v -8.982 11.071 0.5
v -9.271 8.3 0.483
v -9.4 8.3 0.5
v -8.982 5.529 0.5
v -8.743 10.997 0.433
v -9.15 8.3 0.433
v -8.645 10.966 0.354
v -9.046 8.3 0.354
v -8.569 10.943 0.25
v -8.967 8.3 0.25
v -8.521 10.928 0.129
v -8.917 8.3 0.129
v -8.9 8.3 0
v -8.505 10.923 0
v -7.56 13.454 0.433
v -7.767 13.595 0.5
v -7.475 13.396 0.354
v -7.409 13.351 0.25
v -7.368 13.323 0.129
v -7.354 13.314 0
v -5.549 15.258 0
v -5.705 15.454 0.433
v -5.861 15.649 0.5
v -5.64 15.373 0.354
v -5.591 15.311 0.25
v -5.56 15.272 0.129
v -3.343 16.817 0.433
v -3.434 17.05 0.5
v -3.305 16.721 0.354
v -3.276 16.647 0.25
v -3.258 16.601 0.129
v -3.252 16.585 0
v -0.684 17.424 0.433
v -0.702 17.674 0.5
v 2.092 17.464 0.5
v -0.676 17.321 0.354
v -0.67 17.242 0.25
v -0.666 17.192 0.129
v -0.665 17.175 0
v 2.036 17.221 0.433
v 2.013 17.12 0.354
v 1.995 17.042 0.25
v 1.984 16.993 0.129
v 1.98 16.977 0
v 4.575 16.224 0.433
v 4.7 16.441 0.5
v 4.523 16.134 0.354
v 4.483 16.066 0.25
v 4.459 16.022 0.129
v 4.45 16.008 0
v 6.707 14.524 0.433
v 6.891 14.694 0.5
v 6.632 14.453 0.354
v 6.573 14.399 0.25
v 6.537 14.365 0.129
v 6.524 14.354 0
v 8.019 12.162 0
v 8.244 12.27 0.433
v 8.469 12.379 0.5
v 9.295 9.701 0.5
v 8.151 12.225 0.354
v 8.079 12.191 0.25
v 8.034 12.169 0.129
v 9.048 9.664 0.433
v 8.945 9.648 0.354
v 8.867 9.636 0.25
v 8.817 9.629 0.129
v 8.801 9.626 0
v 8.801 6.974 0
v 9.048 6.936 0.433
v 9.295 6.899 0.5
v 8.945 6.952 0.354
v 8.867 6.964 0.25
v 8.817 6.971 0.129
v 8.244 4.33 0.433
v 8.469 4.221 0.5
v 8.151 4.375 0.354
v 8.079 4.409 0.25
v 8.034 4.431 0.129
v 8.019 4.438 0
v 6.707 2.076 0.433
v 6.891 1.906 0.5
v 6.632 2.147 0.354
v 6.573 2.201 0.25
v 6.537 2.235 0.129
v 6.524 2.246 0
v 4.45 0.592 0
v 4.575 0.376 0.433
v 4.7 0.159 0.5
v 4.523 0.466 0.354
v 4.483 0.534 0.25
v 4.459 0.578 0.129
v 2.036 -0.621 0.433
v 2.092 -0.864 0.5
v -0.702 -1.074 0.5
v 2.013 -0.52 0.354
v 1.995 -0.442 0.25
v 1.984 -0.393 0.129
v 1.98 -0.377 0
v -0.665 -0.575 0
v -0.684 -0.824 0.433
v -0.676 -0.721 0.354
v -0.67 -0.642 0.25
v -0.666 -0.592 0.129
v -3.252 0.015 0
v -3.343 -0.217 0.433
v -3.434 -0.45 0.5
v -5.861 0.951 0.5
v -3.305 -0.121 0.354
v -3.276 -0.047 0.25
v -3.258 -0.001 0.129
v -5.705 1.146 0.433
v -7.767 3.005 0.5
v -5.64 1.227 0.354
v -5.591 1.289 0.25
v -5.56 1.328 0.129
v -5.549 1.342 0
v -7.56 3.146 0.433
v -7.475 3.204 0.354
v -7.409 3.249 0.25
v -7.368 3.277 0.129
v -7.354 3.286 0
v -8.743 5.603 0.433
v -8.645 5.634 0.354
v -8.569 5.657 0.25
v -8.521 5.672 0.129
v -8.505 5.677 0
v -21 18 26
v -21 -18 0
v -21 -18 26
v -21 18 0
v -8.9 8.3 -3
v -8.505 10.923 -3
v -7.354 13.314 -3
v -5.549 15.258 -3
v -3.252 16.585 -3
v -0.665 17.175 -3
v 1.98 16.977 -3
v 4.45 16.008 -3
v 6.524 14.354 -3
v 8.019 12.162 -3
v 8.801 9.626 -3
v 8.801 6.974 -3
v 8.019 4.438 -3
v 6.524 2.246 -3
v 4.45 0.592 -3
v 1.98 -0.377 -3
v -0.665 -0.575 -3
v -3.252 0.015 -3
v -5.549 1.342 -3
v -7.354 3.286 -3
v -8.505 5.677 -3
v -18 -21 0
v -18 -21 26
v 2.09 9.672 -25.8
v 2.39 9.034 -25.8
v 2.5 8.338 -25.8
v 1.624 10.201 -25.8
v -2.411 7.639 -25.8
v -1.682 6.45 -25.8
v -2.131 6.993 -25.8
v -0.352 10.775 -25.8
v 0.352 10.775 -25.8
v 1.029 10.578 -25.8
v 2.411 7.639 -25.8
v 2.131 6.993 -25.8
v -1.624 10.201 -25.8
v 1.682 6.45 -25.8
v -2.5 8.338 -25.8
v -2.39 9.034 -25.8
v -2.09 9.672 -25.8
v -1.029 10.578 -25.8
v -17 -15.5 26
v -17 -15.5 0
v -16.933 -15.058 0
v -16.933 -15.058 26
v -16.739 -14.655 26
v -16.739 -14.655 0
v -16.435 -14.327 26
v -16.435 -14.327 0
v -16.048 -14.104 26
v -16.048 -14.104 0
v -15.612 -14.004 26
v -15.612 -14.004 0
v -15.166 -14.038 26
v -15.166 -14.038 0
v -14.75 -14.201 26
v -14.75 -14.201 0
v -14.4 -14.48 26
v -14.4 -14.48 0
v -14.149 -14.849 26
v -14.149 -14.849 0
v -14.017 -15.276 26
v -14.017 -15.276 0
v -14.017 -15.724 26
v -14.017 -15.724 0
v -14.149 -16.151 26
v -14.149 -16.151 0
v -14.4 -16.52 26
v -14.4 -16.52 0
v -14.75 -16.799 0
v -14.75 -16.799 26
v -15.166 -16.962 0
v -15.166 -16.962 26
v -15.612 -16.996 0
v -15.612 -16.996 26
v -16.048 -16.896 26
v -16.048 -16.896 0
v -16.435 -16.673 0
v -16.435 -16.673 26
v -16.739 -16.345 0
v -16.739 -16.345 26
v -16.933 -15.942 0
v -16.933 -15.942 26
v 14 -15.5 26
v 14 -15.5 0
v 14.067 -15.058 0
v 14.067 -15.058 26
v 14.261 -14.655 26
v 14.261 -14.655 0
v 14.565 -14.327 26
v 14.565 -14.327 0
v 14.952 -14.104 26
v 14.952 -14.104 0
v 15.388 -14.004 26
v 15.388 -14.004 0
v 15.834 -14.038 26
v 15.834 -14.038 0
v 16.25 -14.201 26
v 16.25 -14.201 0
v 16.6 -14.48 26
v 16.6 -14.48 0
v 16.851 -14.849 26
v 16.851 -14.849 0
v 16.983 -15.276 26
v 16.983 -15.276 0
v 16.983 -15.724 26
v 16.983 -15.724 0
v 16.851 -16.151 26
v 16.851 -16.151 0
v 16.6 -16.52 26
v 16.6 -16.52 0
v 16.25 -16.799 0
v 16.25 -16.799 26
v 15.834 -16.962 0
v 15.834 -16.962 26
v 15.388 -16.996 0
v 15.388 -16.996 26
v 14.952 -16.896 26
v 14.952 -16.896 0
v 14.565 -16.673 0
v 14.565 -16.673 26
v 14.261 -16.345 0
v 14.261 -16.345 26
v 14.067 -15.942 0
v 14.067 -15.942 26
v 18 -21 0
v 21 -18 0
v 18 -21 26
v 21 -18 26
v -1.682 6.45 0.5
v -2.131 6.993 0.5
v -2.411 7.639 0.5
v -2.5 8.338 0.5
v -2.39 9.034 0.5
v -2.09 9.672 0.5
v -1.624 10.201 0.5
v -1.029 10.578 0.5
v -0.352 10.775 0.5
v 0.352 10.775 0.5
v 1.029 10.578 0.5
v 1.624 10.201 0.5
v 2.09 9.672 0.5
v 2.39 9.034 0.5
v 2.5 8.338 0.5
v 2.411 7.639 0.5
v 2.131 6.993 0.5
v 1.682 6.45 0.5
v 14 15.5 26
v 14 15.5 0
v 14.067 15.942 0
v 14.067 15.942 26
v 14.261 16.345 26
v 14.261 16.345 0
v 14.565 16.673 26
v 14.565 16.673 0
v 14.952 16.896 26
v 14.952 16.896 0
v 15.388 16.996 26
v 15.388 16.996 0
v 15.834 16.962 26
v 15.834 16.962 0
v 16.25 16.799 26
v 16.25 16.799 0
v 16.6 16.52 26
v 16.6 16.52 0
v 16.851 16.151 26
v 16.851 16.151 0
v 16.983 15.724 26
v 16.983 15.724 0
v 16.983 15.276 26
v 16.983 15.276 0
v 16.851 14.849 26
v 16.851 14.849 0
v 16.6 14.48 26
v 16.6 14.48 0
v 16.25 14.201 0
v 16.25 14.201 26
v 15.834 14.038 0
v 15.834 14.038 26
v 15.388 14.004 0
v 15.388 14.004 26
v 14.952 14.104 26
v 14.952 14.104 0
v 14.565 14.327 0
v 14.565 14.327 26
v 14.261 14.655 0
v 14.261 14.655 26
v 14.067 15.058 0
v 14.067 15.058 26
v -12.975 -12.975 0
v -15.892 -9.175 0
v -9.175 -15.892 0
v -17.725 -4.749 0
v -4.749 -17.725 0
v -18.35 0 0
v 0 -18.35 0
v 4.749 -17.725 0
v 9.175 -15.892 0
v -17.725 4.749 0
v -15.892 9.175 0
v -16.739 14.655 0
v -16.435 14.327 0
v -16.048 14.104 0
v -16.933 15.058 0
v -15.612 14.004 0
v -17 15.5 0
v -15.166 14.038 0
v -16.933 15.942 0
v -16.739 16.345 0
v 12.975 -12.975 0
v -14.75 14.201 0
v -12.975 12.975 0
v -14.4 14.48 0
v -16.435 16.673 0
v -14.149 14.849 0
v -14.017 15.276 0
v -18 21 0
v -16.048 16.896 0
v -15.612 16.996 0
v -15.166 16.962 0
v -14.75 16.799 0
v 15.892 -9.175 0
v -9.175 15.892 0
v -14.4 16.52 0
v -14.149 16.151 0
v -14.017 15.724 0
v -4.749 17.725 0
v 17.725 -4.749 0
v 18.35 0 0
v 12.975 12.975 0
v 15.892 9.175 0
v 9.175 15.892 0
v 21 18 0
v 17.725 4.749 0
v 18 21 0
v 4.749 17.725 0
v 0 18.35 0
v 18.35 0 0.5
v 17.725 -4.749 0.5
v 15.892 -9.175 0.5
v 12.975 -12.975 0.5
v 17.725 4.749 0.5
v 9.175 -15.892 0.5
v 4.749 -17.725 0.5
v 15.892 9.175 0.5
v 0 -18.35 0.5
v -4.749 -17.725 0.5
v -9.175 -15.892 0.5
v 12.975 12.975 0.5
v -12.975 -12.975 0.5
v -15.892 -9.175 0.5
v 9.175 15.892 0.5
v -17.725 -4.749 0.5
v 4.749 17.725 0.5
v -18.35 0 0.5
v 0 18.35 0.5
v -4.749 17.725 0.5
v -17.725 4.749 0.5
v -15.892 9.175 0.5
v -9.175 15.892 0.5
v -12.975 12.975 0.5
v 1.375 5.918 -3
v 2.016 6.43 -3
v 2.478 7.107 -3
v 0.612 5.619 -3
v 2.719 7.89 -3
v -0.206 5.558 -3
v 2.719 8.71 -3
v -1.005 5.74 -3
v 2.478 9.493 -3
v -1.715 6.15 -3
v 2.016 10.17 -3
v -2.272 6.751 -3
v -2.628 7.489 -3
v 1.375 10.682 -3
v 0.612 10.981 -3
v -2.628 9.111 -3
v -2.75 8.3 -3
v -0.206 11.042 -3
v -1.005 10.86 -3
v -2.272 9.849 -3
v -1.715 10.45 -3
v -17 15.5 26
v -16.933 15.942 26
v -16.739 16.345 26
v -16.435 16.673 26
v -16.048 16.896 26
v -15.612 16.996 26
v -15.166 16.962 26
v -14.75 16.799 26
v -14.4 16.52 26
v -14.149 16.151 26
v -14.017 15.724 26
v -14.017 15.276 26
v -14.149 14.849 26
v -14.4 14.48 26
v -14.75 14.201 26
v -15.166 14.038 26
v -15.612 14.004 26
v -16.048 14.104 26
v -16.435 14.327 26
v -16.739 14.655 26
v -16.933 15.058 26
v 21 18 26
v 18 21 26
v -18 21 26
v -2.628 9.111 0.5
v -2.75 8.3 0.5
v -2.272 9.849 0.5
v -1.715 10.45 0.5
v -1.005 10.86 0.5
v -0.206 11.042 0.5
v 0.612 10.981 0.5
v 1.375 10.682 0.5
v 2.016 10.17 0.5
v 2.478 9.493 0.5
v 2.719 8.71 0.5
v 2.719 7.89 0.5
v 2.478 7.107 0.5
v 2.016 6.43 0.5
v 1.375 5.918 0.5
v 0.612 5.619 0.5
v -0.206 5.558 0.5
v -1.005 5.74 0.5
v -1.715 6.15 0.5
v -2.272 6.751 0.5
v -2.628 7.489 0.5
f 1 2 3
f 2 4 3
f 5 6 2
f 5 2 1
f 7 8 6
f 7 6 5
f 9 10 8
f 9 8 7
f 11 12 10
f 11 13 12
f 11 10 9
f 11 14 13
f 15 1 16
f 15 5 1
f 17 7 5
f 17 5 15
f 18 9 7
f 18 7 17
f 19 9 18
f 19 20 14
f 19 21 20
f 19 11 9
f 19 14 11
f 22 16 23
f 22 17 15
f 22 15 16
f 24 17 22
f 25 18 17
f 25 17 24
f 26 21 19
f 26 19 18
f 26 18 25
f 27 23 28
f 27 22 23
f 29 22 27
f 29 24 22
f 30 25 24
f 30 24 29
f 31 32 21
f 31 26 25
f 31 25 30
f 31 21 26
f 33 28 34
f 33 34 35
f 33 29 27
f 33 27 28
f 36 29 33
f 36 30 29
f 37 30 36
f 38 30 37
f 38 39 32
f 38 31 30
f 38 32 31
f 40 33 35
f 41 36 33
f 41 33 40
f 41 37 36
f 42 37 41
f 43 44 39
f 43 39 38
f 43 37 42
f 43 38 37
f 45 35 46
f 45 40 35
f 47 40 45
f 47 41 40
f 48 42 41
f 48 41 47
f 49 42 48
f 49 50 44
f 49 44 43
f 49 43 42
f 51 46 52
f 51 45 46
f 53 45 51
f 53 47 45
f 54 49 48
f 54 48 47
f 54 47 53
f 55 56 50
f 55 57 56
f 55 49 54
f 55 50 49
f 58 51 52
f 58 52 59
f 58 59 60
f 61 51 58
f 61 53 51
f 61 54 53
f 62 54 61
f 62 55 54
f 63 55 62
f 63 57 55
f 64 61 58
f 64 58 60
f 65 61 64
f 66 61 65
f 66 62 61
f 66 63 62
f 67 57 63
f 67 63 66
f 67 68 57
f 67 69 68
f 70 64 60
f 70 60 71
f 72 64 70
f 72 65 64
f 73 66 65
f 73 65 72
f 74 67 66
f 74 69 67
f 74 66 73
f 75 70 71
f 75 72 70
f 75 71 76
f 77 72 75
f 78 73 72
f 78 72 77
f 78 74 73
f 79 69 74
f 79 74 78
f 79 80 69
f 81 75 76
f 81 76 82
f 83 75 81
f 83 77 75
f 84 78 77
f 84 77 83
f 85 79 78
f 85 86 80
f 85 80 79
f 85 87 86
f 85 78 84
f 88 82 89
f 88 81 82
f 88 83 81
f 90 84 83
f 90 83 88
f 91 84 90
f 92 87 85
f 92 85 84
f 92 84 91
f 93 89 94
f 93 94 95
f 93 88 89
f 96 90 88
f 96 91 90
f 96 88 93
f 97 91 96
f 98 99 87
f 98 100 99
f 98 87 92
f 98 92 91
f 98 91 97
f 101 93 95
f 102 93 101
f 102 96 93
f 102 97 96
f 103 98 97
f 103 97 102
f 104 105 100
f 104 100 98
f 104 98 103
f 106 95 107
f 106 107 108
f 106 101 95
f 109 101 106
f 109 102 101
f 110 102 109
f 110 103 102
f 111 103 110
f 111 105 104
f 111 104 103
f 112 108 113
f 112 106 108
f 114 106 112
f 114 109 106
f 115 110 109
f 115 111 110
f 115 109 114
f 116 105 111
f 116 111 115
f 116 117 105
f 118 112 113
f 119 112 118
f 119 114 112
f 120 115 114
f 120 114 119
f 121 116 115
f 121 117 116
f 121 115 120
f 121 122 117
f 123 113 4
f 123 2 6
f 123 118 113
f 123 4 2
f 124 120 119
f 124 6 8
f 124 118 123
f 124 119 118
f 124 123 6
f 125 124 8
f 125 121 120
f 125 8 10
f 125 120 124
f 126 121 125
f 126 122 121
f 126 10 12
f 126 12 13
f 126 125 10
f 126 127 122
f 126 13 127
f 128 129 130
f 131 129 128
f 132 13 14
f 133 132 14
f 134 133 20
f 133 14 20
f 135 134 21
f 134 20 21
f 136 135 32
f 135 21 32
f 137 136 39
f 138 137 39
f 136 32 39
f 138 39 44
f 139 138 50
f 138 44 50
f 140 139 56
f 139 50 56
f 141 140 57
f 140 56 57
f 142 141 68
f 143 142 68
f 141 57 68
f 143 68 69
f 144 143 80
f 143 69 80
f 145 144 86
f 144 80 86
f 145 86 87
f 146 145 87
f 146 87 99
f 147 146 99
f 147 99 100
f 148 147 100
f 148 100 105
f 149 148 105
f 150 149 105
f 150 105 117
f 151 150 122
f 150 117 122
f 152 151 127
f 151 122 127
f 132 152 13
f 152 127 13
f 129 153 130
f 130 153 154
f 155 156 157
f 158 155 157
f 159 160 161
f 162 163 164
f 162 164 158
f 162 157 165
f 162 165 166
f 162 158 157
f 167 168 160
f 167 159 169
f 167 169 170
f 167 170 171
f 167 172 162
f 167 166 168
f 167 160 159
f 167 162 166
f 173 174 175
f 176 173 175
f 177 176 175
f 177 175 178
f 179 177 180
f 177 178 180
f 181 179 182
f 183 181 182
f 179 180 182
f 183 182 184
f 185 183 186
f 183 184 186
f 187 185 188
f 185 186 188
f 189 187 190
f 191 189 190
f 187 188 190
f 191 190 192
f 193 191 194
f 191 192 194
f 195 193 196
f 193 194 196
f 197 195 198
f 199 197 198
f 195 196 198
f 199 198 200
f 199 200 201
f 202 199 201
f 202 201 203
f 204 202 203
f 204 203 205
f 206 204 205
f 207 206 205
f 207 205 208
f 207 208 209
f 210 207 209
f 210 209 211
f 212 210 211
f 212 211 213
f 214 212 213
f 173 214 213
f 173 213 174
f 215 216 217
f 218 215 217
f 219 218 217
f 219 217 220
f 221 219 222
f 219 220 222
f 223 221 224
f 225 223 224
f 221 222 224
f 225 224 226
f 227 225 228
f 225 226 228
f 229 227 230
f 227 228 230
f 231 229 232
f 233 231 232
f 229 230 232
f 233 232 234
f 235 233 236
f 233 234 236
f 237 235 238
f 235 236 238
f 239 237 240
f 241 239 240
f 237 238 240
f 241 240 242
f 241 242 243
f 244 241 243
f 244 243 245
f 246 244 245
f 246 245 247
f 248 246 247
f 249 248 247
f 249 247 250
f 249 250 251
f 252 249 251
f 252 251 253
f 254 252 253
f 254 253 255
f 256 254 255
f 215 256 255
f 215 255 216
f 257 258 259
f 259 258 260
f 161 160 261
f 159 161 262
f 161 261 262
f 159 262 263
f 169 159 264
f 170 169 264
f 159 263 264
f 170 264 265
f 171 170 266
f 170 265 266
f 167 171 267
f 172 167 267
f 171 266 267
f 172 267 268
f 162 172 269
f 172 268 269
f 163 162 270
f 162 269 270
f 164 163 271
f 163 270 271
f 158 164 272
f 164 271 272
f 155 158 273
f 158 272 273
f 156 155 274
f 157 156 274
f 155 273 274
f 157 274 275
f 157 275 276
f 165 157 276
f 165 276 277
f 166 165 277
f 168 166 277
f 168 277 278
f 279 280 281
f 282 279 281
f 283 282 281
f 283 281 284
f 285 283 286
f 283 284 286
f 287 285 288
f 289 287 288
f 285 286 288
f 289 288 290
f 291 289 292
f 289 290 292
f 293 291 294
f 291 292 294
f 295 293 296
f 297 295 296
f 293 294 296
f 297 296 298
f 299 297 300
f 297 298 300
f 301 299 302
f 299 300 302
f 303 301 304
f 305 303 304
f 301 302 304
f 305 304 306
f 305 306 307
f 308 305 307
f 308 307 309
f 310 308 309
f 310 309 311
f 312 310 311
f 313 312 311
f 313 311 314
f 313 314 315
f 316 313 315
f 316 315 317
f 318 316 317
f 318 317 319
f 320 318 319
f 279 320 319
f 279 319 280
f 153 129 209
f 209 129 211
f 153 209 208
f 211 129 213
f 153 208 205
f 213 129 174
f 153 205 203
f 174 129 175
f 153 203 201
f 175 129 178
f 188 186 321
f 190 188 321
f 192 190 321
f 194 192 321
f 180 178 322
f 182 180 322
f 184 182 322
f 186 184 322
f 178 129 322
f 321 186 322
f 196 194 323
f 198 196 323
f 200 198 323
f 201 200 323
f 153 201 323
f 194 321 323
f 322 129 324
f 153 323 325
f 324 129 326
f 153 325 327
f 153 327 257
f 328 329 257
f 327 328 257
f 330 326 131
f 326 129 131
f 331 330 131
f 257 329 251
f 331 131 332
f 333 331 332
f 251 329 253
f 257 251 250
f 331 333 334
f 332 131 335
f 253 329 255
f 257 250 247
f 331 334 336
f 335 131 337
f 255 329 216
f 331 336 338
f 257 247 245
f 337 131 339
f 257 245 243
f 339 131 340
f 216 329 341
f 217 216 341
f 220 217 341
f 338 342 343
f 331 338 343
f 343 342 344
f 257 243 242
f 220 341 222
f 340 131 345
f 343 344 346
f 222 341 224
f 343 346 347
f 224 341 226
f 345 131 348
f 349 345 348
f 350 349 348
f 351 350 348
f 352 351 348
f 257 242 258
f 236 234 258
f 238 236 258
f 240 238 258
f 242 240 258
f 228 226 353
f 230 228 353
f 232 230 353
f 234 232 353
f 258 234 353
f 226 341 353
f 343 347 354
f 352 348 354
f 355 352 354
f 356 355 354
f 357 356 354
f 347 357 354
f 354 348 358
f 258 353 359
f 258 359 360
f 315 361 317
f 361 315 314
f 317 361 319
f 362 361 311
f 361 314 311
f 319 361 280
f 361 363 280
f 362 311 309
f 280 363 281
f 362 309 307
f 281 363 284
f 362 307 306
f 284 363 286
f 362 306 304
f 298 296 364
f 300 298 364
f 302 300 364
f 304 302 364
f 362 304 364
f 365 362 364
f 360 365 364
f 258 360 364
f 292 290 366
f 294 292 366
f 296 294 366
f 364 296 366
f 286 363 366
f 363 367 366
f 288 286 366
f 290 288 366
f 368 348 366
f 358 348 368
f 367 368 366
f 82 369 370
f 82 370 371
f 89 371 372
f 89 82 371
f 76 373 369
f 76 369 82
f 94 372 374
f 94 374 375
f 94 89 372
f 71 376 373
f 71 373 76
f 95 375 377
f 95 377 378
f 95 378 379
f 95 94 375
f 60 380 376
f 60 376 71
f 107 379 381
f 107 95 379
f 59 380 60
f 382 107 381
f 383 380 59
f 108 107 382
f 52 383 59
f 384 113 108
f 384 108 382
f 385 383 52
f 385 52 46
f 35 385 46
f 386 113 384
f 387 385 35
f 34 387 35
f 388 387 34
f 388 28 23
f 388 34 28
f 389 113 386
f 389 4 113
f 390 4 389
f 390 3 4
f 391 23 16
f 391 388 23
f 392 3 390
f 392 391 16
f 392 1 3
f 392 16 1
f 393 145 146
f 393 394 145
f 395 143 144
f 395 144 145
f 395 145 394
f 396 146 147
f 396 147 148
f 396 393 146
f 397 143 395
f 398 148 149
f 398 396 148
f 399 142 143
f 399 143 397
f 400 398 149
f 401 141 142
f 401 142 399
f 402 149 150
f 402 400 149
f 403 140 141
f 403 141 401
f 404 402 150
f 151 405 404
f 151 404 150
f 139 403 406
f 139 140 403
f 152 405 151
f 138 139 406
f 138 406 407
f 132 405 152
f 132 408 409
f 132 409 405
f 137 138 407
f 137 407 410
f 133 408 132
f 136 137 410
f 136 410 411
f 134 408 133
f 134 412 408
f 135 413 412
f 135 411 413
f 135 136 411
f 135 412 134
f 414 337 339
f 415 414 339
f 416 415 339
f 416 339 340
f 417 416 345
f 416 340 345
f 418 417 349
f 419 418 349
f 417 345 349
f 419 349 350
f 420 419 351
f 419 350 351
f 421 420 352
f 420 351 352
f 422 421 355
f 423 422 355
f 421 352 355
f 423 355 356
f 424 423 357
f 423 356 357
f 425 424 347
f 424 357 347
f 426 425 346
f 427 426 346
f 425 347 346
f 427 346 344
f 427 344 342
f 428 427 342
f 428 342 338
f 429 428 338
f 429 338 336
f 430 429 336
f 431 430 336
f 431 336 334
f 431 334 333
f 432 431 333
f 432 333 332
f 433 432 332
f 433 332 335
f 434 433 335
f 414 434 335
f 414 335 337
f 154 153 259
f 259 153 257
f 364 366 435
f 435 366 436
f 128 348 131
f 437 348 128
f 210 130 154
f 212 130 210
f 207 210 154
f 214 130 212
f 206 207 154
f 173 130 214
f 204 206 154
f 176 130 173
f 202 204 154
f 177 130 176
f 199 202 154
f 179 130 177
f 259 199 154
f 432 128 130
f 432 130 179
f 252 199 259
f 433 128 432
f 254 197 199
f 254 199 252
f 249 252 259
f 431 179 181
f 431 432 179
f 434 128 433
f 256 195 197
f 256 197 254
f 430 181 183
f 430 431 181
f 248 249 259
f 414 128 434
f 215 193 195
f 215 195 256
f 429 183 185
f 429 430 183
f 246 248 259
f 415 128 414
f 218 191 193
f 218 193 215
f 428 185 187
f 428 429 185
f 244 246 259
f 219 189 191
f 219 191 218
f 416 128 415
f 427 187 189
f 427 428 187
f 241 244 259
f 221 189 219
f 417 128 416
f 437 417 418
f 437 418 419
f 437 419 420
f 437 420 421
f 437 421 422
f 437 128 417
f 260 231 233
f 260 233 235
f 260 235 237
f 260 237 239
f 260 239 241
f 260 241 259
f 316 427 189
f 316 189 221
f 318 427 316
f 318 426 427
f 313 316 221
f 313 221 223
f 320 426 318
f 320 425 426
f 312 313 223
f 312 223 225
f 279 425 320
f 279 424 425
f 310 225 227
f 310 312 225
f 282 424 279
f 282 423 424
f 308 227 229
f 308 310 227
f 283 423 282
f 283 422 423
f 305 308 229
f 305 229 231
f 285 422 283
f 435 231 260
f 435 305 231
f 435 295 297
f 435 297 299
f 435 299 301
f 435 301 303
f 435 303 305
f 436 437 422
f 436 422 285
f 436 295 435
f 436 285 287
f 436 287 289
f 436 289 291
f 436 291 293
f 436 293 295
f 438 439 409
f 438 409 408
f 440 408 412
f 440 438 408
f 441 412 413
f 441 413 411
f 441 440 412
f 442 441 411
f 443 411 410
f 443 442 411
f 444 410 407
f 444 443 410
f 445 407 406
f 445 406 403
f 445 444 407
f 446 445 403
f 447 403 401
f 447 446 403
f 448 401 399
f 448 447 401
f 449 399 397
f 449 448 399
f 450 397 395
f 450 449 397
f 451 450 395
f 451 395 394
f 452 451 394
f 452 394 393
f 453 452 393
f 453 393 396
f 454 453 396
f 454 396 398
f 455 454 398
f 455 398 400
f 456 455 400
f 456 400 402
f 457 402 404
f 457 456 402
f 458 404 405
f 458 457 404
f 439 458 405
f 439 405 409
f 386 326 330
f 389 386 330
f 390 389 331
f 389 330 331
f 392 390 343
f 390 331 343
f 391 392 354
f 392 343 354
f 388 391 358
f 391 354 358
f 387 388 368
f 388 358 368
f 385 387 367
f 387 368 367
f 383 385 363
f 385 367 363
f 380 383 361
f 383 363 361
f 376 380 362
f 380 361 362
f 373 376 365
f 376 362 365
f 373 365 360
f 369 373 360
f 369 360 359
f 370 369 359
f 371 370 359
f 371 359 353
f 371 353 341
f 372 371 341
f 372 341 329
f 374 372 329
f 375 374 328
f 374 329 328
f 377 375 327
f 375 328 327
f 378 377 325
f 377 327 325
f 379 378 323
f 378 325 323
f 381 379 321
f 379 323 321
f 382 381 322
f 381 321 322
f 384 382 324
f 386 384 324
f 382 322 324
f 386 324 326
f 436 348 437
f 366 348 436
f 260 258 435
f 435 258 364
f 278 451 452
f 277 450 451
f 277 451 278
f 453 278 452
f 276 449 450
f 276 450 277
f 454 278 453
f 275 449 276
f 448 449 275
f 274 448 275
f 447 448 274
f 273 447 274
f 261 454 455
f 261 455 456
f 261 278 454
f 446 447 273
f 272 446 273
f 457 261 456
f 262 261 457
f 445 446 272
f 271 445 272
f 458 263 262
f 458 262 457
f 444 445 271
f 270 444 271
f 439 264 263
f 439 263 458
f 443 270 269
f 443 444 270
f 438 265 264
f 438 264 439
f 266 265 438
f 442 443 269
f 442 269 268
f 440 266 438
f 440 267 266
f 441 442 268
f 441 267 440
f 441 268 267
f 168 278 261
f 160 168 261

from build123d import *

# Parameters (mm, degrees)
SKETCH1_W           = 42
SKETCH1_H           = 42
BOSS_EXTRUDE1_DEPTH = 26
CHAMFER1_SIZE       = 3
SKETCH4_R           = 11.25
BOSS_EXTRUDE2_DEPTH = 0.5
CUT_EXTRUDE4_REACH  = 41.472
SKETCH8_R           = 1.5
SKETCH9_R           = 18.35
CUT_EXTRUDE5_DEPTH  = 0.5
SKETCH10_R          = 8.9
SKETCH10_R_2        = 2.75
BOSS_EXTRUDE3_DEPTH = 3.5
BOSS_EXTRUDE4_DEPTH = 26.3
FILLET1_R           = 0.5


with BuildPart() as part:
    # Sketch1 → Boss-Extrude1 (new body)
    with BuildSketch(Plane.XY):
        Rectangle(SKETCH1_W, SKETCH1_H)
    extrude(amount=BOSS_EXTRUDE1_DEPTH)

    # Chamfer1
    chamfer1_edges = [part.edges().sort_by_distance(p)[0] for p in [
        (-21, 21, 13),
        (21, 21, 13),
        (21, -21, 13),
        (-21, -21, 13),
    ]]
    chamfer(chamfer1_edges, length=CHAMFER1_SIZE)

    # Sketch4 → Boss-Extrude2 (add)
    with BuildSketch(Plane(origin=(0, 0, 0), x_dir=(-1, 0, 0), z_dir=(0, 0, -1))):
        Circle(SKETCH4_R)
    extrude(amount=-BOSS_EXTRUDE2_DEPTH)

    # Sketch8 → Cut-Extrude4 (cut, up to next)
    with BuildSketch(Plane(origin=(0, 0, 0), x_dir=(-1, 0, 0), z_dir=(0, 0, -1)), mode=Mode.PRIVATE) as cut_extrude4_sk1:
        with Locations((15.5, 15.5)):
            Circle(SKETCH8_R)
    cut_extrude4_tool1 = extrude(cut_extrude4_sk1.sketch, amount=-CUT_EXTRUDE4_REACH, mode=Mode.PRIVATE) & part.part
    # Sketch8 → Cut-Extrude4 (cut, up to next)
    with BuildSketch(Plane(origin=(0, 0, 0), x_dir=(-1, 0, 0), z_dir=(0, 0, -1)), mode=Mode.PRIVATE) as cut_extrude4_sk2:
        with Locations((-15.5, 15.5)):
            Circle(SKETCH8_R)
    cut_extrude4_tool2 = extrude(cut_extrude4_sk2.sketch, amount=-CUT_EXTRUDE4_REACH, mode=Mode.PRIVATE) & part.part
    # Sketch8 → Cut-Extrude4 (cut, up to next)
    with BuildSketch(Plane(origin=(0, 0, 0), x_dir=(-1, 0, 0), z_dir=(0, 0, -1)), mode=Mode.PRIVATE) as cut_extrude4_sk3:
        with Locations((-15.5, -15.5)):
            Circle(SKETCH8_R)
    cut_extrude4_tool3 = extrude(cut_extrude4_sk3.sketch, amount=-CUT_EXTRUDE4_REACH, mode=Mode.PRIVATE) & part.part
    # Sketch8 → Cut-Extrude4 (cut, up to next)
    with BuildSketch(Plane(origin=(0, 0, 0), x_dir=(-1, 0, 0), z_dir=(0, 0, -1)), mode=Mode.PRIVATE) as cut_extrude4_sk4:
        with Locations((15.5, -15.5)):
            Circle(SKETCH8_R)
    cut_extrude4_tool4 = extrude(cut_extrude4_sk4.sketch, amount=-CUT_EXTRUDE4_REACH, mode=Mode.PRIVATE) & part.part
    add(cut_extrude4_tool1.solids().sort_by_distance((-15.5, 15.5, 0))[0], mode=Mode.SUBTRACT)
    add(cut_extrude4_tool2.solids().sort_by_distance((15.5, 15.5, 0))[0], mode=Mode.SUBTRACT)
    add(cut_extrude4_tool3.solids().sort_by_distance((15.5, -15.5, 0))[0], mode=Mode.SUBTRACT)
    add(cut_extrude4_tool4.solids().sort_by_distance((-15.5, -15.5, 0))[0], mode=Mode.SUBTRACT)

    # Sketch9 → Cut-Extrude5 (cut)
    with BuildSketch(Plane(origin=(0, 0, 0), x_dir=(-1, 0, 0), z_dir=(0, 0, -1))):
        Circle(SKETCH9_R)
    extrude(amount=-CUT_EXTRUDE5_DEPTH, mode=Mode.SUBTRACT)

    # Sketch10 → Boss-Extrude3 (add)
    with BuildSketch(Plane(origin=(0, 0, 0.5), x_dir=(-1, 0, 0), z_dir=(0, 0, -1))):
        with Locations((0, 8.3)):
            Circle(SKETCH10_R)
        with Locations((0, 8.3)):
            Circle(SKETCH10_R_2, mode=Mode.SUBTRACT)
    extrude(amount=BOSS_EXTRUDE3_DEPTH)

    # Sketch11 → Boss-Extrude4 (add)
    with BuildSketch(Plane(origin=(0, 0, 0.5), x_dir=(-1, 0, 0), z_dir=(0, 0, -1))):
        with BuildLine():
            Line((-1.681517172, 6.45), (1.681517172, 6.45))
            ThreePointArc((1.681517172, 6.45), (0, 10.8), (-1.681517172, 6.45))
        make_face()
    extrude(amount=BOSS_EXTRUDE4_DEPTH)

    # Fillet1
    fillet1_edges = [part.edges().sort_by_distance(p)[0] for p in [
        (8.9, 8.3, 0.5),
    ]]
    fillet(fillet1_edges, radius=FILLET1_R)


solid = part.part
